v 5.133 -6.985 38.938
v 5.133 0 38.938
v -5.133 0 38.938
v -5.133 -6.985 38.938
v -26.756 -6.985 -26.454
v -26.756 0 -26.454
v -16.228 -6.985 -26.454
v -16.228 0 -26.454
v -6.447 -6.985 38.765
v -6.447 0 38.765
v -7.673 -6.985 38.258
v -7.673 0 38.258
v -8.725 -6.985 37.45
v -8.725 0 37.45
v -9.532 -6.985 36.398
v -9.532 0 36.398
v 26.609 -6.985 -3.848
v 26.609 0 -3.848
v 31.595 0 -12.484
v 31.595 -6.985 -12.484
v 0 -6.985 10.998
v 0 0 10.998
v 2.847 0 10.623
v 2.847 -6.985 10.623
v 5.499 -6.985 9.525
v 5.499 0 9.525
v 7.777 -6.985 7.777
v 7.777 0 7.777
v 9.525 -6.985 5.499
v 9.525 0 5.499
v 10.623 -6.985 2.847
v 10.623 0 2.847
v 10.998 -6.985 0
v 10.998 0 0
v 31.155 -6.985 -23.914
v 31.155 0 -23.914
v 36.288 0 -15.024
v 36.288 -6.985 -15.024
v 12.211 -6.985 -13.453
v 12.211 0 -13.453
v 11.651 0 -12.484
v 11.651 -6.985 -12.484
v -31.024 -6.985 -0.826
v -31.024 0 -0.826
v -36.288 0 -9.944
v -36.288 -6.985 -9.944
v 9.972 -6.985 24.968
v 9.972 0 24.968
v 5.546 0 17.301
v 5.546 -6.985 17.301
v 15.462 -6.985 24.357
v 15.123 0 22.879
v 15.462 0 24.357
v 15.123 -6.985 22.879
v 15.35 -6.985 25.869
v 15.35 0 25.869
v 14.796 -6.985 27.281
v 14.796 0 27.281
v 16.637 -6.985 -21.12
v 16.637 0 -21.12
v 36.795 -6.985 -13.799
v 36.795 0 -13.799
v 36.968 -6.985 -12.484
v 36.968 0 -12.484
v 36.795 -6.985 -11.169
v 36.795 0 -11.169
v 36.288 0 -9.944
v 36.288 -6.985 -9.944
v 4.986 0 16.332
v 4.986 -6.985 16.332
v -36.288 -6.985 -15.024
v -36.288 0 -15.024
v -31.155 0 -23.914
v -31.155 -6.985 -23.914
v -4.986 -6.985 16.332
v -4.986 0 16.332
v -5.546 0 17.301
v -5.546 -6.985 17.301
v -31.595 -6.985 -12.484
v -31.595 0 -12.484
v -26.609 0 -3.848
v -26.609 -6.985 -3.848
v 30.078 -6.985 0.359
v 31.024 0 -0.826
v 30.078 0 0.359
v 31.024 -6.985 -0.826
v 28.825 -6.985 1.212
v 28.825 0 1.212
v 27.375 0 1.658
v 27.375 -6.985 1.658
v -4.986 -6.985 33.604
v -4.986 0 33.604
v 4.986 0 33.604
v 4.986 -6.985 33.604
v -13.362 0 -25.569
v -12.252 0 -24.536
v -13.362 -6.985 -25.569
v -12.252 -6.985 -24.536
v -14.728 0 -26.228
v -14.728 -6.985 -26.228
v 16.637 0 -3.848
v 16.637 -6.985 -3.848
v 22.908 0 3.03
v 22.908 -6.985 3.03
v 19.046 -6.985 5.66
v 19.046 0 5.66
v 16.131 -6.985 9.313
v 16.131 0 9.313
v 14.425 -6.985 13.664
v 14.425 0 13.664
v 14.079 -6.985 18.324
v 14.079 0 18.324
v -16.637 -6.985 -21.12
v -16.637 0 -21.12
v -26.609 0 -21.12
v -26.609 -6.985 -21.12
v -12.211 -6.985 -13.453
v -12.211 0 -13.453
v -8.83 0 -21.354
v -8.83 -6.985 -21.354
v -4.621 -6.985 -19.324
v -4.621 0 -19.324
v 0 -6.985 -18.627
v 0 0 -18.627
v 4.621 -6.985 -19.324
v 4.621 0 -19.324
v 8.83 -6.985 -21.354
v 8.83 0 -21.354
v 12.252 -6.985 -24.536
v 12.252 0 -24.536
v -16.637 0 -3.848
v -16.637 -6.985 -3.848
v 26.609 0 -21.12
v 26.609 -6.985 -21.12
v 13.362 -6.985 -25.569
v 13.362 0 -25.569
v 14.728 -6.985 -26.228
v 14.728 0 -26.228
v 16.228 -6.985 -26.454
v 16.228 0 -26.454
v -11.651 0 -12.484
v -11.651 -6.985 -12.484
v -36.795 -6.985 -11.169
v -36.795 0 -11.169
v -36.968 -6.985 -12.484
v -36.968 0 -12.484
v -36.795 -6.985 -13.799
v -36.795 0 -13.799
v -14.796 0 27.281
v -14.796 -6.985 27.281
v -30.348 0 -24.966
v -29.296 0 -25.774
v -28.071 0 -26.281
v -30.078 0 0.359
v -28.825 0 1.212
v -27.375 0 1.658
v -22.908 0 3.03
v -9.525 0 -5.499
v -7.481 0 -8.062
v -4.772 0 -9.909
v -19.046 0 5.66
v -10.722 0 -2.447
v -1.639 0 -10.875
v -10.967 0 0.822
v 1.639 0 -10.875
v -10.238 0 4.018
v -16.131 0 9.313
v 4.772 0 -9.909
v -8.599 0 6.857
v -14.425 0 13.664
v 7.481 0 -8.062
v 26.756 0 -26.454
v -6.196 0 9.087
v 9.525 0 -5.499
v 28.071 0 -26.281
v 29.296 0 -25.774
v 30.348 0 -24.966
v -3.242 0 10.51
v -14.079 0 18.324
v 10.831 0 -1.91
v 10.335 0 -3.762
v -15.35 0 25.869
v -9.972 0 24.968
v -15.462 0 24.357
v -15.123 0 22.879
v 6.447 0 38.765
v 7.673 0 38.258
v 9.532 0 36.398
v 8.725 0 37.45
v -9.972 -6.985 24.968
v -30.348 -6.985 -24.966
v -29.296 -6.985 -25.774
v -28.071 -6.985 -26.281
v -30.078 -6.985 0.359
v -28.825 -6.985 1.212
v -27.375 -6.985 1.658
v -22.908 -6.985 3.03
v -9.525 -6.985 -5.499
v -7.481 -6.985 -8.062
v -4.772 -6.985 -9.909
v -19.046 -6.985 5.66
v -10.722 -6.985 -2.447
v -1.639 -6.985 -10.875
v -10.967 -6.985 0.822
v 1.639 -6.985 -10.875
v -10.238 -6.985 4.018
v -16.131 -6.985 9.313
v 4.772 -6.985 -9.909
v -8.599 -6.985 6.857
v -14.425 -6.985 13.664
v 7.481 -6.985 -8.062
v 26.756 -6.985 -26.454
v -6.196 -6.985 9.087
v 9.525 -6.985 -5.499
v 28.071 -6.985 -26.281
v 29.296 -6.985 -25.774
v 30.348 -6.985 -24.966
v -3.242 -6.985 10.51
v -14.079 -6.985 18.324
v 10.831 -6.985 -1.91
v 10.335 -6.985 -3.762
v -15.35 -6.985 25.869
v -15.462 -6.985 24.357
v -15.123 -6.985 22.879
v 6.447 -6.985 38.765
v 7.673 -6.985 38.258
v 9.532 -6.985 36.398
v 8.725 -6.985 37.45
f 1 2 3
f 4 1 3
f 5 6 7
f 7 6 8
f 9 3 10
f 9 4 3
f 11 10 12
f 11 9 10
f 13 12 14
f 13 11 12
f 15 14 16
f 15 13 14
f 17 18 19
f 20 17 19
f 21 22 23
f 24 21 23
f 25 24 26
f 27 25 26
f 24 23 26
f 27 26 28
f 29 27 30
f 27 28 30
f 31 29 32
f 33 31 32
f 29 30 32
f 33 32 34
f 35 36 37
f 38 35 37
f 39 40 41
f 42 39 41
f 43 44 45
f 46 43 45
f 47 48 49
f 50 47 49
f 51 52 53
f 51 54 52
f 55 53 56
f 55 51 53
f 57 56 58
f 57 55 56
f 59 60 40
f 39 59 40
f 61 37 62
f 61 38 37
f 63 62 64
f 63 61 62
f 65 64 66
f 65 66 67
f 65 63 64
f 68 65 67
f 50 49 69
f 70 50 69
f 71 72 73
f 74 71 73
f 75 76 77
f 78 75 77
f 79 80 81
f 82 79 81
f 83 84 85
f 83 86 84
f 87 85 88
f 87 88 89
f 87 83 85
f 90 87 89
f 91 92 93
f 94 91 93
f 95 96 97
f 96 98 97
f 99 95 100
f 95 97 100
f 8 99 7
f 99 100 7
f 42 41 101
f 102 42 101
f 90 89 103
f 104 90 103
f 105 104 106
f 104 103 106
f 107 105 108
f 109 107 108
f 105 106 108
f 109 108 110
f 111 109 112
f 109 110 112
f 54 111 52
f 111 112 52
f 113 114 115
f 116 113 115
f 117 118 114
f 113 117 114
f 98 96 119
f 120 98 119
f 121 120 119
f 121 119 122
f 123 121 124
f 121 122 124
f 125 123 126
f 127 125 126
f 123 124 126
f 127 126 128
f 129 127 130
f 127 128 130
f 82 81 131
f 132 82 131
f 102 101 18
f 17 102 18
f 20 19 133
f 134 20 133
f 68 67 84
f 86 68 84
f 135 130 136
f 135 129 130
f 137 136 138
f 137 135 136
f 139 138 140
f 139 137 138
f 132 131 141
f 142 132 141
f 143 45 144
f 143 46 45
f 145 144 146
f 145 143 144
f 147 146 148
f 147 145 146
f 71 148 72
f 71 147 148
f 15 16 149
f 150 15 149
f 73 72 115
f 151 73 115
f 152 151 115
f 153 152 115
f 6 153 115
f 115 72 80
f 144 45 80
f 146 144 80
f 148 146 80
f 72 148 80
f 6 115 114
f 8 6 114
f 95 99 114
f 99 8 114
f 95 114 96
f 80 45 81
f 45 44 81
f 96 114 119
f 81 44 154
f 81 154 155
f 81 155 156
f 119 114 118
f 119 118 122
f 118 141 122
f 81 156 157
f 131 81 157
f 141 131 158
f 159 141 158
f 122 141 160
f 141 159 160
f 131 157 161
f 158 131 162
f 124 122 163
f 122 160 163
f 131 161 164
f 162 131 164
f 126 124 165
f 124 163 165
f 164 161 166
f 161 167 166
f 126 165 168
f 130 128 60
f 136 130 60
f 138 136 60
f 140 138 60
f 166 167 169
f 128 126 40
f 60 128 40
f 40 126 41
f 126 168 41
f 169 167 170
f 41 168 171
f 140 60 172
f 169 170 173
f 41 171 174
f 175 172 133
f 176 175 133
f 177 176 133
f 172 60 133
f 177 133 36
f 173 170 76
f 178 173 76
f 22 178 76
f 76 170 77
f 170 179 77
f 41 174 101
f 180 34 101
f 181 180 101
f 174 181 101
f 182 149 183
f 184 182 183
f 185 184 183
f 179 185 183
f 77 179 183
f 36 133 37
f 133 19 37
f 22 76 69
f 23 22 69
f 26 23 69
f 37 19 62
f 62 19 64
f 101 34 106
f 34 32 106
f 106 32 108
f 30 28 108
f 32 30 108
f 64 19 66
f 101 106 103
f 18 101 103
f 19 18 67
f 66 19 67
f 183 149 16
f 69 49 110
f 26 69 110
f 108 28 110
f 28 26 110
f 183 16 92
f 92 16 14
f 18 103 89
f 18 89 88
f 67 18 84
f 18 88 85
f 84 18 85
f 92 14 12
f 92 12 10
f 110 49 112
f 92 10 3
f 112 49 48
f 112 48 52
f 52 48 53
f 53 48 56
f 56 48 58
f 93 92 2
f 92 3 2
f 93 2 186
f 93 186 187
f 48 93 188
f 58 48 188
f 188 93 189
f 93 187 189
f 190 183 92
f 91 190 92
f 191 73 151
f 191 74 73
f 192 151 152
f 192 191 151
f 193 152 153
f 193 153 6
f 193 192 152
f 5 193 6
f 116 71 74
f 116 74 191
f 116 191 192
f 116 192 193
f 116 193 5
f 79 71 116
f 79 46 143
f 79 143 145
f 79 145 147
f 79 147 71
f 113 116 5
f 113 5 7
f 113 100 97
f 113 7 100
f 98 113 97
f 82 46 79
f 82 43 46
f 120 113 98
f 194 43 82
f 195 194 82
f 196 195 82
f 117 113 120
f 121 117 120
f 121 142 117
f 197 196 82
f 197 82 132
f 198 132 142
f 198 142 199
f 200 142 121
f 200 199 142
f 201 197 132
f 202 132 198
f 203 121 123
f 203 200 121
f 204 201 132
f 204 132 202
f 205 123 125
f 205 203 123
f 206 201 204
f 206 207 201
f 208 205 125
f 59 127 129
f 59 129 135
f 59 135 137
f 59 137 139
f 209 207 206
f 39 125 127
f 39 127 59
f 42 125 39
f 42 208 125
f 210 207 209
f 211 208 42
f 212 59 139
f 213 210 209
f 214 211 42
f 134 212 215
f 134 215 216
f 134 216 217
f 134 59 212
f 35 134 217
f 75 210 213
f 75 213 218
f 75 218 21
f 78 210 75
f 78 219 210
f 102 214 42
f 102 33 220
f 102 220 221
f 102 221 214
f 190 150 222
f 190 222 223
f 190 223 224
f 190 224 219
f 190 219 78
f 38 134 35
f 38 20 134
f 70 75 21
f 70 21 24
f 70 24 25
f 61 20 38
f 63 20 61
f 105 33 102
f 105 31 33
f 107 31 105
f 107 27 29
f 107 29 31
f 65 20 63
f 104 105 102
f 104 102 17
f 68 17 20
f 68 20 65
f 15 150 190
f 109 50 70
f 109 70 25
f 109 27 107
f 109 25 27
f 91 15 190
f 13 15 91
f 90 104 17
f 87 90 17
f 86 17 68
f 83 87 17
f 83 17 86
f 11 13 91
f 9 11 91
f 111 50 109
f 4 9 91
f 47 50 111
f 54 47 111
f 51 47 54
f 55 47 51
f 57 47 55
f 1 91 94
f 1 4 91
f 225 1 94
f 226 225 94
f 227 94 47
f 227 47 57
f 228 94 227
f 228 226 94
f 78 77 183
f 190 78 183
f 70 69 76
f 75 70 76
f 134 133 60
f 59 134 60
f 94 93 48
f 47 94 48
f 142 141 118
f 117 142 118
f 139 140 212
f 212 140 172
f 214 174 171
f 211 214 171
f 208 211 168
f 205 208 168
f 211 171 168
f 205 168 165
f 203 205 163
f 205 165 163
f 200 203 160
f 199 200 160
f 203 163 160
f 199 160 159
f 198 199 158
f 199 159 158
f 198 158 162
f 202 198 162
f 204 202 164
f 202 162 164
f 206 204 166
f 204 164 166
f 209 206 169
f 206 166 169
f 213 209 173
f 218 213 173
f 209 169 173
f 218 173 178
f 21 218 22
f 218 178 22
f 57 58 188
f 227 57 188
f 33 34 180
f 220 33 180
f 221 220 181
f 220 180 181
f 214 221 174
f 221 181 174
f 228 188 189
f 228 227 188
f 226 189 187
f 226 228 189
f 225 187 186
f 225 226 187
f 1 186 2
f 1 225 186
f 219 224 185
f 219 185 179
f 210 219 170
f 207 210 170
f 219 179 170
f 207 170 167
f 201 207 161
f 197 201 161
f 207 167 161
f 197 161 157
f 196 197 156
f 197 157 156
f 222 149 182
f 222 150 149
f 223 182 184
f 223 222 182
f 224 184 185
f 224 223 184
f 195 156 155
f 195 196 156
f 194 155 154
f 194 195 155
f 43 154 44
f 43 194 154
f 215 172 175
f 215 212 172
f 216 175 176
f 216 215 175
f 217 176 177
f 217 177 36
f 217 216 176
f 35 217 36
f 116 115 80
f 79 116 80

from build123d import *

# Parameters (mm, degrees)
F1_DEPTH = 6.985
F2_R     = 5.08


with BuildPart() as f1:
    # F0 (on Front) → F1 (new body)
    with BuildSketch(Plane.XZ):
        with BuildLine():
            Line((16.1311665212, 24.9682), (10.846794214, 15.8153986779))
            Line((10.846794214, 15.8153986779), (19.1199341331, 1.4859))
            Line((19.1199341331, 1.4859), (29.6886787473, 1.4859))
            ThreePointArc((29.6886787473, 1.4859), (16.1311665212, 9.3133333333), (16.1311665212, 24.9682))
        make_face()
        Polygon((9.988909449, 17.3012986779), (10.846794214, 15.8153986779), (16.1311665212, 24.9682), (8.0655832606, 38.9382), (-8.0655832606, 38.9382), (-16.1311665212, 24.9682), (-10.846794214, 15.8153986779), (-9.988909449, 17.3012986779), (-5.5455063073, 17.3012986779), (-9.9719938494, 24.9682), (-4.9859969247, 33.6042), (4.9859969247, 33.6042), (9.9719938494, 24.9682), (5.5455063073, 17.3012986779), align=None)
        with BuildLine():
            Line((-19.1199341331, 1.4859), (-10.846794214, 15.8153986779))
            Line((-10.846794214, 15.8153986779), (-16.1311665212, 24.9682))
            ThreePointArc((-16.1311665212, 24.9682), (-16.1311665212, 9.3133333333), (-29.6886787473, 1.4859))
            Line((-29.6886787473, 1.4859), (-19.1199341331, 1.4859))
        make_face()
        with BuildLine():
            Line((13.5575122262, -26.4541), (8.2731399191, -17.3012986779))
            Line((8.2731399191, -17.3012986779), (-8.2731399191, -17.3012986779))
            Line((-8.2731399191, -17.3012986779), (-13.5575122262, -26.4541))
            ThreePointArc((-13.5575122262, -26.4541), (0, -18.6266666667), (13.5575122262, -26.4541))
        make_face()
        Polygon((9.988909449, -17.3012986779), (8.2731399191, -17.3012986779), (13.5575122262, -26.4541), (29.6886787473, -26.4541), (37.7542620079, -12.4841), (29.6886787473, 1.4859), (19.1199341331, 1.4859), (19.9778188981, 0), (17.7561173272, -3.8481), (26.6090924115, -3.8481), (31.5950893362, -12.4841), (26.6090924115, -21.1201), (16.637098562, -21.1201), (12.2106110199, -13.4531986779), align=None)
        Polygon((-19.9778188981, 0), (-19.1199341331, 1.4859), (-29.6886787473, 1.4859), (-37.7542620079, -12.4841), (-29.6886787473, -26.4541), (-13.5575122262, -26.4541), (-8.2731399191, -17.3012986779), (-9.988909449, -17.3012986779), (-12.2106110199, -13.4531986779), (-16.637098562, -21.1201), (-26.6090924115, -21.1201), (-31.5950893362, -12.4841), (-26.6090924115, -3.8481), (-17.7561173272, -3.8481), align=None)
        with BuildLine():
            ThreePointArc((0, 10.9982), (7.7769018008, 7.7769018008), (10.9982, 0))
            ThreePointArc((10.9982, 0), (10.6234453514, -2.8465438878), (9.5247203206, -5.4991004769))
            Line((9.5247203206, -5.4991004769), (13.5575122262, 1.4859))
            Line((13.5575122262, 1.4859), (19.1199341331, 1.4859))
            Line((19.1199341331, 1.4859), (10.846794214, 15.8153986779))
            Line((10.846794214, 15.8153986779), (8.0655832606, 10.9982))
            Line((8.0655832606, 10.9982), (0, 10.9982))
        make_face()
        Polygon((-5.4919289656, -12.4841), (-9.5247203821, -5.4991003703), (-13.5575122262, 1.4859), (-19.1199341331, 1.4859), (-19.9778188981, 0), (-17.7561173272, -3.8481), (-16.637098562, -3.8481), (-11.6511016373, -12.4841), (-12.2106110199, -13.4531986779), (-9.988909449, -17.3012986779), (-8.2731399191, -17.3012986779), align=None)
        with BuildLine():
            ThreePointArc((-9.5247203821, -5.4991003703), (-9.5247207028, 5.4990998148), (0, 10.9982))
            Line((0, 10.9982), (-8.0655832606, 10.9982))
            Line((-8.0655832606, 10.9982), (-10.846794214, 15.8153986779))
            Line((-10.846794214, 15.8153986779), (-19.1199341331, 1.4859))
            Line((-19.1199341331, 1.4859), (-13.5575122262, 1.4859))
            Line((-13.5575122262, 1.4859), (-9.5247203821, -5.4991003703))
        make_face()
        Polygon((13.5575122262, 1.4859), (9.5247203206, -5.4991004769), (5.4919289656, -12.4841), (8.2731399191, -17.3012986779), (9.988909449, -17.3012986779), (12.2106110199, -13.4531986779), (11.6511016373, -12.4841), (16.637098562, -3.8481), (17.7561173272, -3.8481), (19.9778188981, 0), (19.1199341331, 1.4859), align=None)
        Polygon((-8.0655832606, 10.9982), (0, 10.9982), (8.0655832606, 10.9982), (10.846794214, 15.8153986779), (9.988909449, 17.3012986779), (5.5455063073, 17.3012986779), (4.9859969247, 16.3322), (-4.9859969247, 16.3322), (-5.5455063073, 17.3012986779), (-9.988909449, 17.3012986779), (-10.846794214, 15.8153986779), align=None)
        with BuildLine():
            Line((5.4919289656, -12.4841), (9.5247203206, -5.4991004769))
            ThreePointArc((9.5247203206, -5.4991004769), (-6.15e-08, -10.9982), (-9.5247203821, -5.4991003703))
            Line((-9.5247203821, -5.4991003703), (-5.4919289656, -12.4841))
            Line((-5.4919289656, -12.4841), (-8.2731399191, -17.3012986779))
            Line((-8.2731399191, -17.3012986779), (8.2731399191, -17.3012986779))
            Line((8.2731399191, -17.3012986779), (5.4919289656, -12.4841))
        make_face()
    extrude(amount=F1_DEPTH)

    # F2
    f2_edges = [f1.edges().sort_by_distance(p)[0] for p in [
        (16.131167, -3.4925, 24.9682),
        (-8.065583, -3.4925, 38.9382),
        (8.065583, -3.4925, 38.9382),
        (-16.131167, -3.4925, 24.9682),
        (-29.688679, -3.4925, 1.4859),
        (-37.754262, -3.4925, -12.4841),
        (-13.557512, -3.4925, -26.4541),
        (-29.688679, -3.4925, -26.4541),
        (13.557512, -3.4925, -26.4541),
        (29.688679, -3.4925, -26.4541),
        (37.754262, -3.4925, -12.4841),
        (29.688679, -3.4925, 1.4859),
    ]]
    fillet(f2_edges, radius=F2_R)


solid = f1.part
